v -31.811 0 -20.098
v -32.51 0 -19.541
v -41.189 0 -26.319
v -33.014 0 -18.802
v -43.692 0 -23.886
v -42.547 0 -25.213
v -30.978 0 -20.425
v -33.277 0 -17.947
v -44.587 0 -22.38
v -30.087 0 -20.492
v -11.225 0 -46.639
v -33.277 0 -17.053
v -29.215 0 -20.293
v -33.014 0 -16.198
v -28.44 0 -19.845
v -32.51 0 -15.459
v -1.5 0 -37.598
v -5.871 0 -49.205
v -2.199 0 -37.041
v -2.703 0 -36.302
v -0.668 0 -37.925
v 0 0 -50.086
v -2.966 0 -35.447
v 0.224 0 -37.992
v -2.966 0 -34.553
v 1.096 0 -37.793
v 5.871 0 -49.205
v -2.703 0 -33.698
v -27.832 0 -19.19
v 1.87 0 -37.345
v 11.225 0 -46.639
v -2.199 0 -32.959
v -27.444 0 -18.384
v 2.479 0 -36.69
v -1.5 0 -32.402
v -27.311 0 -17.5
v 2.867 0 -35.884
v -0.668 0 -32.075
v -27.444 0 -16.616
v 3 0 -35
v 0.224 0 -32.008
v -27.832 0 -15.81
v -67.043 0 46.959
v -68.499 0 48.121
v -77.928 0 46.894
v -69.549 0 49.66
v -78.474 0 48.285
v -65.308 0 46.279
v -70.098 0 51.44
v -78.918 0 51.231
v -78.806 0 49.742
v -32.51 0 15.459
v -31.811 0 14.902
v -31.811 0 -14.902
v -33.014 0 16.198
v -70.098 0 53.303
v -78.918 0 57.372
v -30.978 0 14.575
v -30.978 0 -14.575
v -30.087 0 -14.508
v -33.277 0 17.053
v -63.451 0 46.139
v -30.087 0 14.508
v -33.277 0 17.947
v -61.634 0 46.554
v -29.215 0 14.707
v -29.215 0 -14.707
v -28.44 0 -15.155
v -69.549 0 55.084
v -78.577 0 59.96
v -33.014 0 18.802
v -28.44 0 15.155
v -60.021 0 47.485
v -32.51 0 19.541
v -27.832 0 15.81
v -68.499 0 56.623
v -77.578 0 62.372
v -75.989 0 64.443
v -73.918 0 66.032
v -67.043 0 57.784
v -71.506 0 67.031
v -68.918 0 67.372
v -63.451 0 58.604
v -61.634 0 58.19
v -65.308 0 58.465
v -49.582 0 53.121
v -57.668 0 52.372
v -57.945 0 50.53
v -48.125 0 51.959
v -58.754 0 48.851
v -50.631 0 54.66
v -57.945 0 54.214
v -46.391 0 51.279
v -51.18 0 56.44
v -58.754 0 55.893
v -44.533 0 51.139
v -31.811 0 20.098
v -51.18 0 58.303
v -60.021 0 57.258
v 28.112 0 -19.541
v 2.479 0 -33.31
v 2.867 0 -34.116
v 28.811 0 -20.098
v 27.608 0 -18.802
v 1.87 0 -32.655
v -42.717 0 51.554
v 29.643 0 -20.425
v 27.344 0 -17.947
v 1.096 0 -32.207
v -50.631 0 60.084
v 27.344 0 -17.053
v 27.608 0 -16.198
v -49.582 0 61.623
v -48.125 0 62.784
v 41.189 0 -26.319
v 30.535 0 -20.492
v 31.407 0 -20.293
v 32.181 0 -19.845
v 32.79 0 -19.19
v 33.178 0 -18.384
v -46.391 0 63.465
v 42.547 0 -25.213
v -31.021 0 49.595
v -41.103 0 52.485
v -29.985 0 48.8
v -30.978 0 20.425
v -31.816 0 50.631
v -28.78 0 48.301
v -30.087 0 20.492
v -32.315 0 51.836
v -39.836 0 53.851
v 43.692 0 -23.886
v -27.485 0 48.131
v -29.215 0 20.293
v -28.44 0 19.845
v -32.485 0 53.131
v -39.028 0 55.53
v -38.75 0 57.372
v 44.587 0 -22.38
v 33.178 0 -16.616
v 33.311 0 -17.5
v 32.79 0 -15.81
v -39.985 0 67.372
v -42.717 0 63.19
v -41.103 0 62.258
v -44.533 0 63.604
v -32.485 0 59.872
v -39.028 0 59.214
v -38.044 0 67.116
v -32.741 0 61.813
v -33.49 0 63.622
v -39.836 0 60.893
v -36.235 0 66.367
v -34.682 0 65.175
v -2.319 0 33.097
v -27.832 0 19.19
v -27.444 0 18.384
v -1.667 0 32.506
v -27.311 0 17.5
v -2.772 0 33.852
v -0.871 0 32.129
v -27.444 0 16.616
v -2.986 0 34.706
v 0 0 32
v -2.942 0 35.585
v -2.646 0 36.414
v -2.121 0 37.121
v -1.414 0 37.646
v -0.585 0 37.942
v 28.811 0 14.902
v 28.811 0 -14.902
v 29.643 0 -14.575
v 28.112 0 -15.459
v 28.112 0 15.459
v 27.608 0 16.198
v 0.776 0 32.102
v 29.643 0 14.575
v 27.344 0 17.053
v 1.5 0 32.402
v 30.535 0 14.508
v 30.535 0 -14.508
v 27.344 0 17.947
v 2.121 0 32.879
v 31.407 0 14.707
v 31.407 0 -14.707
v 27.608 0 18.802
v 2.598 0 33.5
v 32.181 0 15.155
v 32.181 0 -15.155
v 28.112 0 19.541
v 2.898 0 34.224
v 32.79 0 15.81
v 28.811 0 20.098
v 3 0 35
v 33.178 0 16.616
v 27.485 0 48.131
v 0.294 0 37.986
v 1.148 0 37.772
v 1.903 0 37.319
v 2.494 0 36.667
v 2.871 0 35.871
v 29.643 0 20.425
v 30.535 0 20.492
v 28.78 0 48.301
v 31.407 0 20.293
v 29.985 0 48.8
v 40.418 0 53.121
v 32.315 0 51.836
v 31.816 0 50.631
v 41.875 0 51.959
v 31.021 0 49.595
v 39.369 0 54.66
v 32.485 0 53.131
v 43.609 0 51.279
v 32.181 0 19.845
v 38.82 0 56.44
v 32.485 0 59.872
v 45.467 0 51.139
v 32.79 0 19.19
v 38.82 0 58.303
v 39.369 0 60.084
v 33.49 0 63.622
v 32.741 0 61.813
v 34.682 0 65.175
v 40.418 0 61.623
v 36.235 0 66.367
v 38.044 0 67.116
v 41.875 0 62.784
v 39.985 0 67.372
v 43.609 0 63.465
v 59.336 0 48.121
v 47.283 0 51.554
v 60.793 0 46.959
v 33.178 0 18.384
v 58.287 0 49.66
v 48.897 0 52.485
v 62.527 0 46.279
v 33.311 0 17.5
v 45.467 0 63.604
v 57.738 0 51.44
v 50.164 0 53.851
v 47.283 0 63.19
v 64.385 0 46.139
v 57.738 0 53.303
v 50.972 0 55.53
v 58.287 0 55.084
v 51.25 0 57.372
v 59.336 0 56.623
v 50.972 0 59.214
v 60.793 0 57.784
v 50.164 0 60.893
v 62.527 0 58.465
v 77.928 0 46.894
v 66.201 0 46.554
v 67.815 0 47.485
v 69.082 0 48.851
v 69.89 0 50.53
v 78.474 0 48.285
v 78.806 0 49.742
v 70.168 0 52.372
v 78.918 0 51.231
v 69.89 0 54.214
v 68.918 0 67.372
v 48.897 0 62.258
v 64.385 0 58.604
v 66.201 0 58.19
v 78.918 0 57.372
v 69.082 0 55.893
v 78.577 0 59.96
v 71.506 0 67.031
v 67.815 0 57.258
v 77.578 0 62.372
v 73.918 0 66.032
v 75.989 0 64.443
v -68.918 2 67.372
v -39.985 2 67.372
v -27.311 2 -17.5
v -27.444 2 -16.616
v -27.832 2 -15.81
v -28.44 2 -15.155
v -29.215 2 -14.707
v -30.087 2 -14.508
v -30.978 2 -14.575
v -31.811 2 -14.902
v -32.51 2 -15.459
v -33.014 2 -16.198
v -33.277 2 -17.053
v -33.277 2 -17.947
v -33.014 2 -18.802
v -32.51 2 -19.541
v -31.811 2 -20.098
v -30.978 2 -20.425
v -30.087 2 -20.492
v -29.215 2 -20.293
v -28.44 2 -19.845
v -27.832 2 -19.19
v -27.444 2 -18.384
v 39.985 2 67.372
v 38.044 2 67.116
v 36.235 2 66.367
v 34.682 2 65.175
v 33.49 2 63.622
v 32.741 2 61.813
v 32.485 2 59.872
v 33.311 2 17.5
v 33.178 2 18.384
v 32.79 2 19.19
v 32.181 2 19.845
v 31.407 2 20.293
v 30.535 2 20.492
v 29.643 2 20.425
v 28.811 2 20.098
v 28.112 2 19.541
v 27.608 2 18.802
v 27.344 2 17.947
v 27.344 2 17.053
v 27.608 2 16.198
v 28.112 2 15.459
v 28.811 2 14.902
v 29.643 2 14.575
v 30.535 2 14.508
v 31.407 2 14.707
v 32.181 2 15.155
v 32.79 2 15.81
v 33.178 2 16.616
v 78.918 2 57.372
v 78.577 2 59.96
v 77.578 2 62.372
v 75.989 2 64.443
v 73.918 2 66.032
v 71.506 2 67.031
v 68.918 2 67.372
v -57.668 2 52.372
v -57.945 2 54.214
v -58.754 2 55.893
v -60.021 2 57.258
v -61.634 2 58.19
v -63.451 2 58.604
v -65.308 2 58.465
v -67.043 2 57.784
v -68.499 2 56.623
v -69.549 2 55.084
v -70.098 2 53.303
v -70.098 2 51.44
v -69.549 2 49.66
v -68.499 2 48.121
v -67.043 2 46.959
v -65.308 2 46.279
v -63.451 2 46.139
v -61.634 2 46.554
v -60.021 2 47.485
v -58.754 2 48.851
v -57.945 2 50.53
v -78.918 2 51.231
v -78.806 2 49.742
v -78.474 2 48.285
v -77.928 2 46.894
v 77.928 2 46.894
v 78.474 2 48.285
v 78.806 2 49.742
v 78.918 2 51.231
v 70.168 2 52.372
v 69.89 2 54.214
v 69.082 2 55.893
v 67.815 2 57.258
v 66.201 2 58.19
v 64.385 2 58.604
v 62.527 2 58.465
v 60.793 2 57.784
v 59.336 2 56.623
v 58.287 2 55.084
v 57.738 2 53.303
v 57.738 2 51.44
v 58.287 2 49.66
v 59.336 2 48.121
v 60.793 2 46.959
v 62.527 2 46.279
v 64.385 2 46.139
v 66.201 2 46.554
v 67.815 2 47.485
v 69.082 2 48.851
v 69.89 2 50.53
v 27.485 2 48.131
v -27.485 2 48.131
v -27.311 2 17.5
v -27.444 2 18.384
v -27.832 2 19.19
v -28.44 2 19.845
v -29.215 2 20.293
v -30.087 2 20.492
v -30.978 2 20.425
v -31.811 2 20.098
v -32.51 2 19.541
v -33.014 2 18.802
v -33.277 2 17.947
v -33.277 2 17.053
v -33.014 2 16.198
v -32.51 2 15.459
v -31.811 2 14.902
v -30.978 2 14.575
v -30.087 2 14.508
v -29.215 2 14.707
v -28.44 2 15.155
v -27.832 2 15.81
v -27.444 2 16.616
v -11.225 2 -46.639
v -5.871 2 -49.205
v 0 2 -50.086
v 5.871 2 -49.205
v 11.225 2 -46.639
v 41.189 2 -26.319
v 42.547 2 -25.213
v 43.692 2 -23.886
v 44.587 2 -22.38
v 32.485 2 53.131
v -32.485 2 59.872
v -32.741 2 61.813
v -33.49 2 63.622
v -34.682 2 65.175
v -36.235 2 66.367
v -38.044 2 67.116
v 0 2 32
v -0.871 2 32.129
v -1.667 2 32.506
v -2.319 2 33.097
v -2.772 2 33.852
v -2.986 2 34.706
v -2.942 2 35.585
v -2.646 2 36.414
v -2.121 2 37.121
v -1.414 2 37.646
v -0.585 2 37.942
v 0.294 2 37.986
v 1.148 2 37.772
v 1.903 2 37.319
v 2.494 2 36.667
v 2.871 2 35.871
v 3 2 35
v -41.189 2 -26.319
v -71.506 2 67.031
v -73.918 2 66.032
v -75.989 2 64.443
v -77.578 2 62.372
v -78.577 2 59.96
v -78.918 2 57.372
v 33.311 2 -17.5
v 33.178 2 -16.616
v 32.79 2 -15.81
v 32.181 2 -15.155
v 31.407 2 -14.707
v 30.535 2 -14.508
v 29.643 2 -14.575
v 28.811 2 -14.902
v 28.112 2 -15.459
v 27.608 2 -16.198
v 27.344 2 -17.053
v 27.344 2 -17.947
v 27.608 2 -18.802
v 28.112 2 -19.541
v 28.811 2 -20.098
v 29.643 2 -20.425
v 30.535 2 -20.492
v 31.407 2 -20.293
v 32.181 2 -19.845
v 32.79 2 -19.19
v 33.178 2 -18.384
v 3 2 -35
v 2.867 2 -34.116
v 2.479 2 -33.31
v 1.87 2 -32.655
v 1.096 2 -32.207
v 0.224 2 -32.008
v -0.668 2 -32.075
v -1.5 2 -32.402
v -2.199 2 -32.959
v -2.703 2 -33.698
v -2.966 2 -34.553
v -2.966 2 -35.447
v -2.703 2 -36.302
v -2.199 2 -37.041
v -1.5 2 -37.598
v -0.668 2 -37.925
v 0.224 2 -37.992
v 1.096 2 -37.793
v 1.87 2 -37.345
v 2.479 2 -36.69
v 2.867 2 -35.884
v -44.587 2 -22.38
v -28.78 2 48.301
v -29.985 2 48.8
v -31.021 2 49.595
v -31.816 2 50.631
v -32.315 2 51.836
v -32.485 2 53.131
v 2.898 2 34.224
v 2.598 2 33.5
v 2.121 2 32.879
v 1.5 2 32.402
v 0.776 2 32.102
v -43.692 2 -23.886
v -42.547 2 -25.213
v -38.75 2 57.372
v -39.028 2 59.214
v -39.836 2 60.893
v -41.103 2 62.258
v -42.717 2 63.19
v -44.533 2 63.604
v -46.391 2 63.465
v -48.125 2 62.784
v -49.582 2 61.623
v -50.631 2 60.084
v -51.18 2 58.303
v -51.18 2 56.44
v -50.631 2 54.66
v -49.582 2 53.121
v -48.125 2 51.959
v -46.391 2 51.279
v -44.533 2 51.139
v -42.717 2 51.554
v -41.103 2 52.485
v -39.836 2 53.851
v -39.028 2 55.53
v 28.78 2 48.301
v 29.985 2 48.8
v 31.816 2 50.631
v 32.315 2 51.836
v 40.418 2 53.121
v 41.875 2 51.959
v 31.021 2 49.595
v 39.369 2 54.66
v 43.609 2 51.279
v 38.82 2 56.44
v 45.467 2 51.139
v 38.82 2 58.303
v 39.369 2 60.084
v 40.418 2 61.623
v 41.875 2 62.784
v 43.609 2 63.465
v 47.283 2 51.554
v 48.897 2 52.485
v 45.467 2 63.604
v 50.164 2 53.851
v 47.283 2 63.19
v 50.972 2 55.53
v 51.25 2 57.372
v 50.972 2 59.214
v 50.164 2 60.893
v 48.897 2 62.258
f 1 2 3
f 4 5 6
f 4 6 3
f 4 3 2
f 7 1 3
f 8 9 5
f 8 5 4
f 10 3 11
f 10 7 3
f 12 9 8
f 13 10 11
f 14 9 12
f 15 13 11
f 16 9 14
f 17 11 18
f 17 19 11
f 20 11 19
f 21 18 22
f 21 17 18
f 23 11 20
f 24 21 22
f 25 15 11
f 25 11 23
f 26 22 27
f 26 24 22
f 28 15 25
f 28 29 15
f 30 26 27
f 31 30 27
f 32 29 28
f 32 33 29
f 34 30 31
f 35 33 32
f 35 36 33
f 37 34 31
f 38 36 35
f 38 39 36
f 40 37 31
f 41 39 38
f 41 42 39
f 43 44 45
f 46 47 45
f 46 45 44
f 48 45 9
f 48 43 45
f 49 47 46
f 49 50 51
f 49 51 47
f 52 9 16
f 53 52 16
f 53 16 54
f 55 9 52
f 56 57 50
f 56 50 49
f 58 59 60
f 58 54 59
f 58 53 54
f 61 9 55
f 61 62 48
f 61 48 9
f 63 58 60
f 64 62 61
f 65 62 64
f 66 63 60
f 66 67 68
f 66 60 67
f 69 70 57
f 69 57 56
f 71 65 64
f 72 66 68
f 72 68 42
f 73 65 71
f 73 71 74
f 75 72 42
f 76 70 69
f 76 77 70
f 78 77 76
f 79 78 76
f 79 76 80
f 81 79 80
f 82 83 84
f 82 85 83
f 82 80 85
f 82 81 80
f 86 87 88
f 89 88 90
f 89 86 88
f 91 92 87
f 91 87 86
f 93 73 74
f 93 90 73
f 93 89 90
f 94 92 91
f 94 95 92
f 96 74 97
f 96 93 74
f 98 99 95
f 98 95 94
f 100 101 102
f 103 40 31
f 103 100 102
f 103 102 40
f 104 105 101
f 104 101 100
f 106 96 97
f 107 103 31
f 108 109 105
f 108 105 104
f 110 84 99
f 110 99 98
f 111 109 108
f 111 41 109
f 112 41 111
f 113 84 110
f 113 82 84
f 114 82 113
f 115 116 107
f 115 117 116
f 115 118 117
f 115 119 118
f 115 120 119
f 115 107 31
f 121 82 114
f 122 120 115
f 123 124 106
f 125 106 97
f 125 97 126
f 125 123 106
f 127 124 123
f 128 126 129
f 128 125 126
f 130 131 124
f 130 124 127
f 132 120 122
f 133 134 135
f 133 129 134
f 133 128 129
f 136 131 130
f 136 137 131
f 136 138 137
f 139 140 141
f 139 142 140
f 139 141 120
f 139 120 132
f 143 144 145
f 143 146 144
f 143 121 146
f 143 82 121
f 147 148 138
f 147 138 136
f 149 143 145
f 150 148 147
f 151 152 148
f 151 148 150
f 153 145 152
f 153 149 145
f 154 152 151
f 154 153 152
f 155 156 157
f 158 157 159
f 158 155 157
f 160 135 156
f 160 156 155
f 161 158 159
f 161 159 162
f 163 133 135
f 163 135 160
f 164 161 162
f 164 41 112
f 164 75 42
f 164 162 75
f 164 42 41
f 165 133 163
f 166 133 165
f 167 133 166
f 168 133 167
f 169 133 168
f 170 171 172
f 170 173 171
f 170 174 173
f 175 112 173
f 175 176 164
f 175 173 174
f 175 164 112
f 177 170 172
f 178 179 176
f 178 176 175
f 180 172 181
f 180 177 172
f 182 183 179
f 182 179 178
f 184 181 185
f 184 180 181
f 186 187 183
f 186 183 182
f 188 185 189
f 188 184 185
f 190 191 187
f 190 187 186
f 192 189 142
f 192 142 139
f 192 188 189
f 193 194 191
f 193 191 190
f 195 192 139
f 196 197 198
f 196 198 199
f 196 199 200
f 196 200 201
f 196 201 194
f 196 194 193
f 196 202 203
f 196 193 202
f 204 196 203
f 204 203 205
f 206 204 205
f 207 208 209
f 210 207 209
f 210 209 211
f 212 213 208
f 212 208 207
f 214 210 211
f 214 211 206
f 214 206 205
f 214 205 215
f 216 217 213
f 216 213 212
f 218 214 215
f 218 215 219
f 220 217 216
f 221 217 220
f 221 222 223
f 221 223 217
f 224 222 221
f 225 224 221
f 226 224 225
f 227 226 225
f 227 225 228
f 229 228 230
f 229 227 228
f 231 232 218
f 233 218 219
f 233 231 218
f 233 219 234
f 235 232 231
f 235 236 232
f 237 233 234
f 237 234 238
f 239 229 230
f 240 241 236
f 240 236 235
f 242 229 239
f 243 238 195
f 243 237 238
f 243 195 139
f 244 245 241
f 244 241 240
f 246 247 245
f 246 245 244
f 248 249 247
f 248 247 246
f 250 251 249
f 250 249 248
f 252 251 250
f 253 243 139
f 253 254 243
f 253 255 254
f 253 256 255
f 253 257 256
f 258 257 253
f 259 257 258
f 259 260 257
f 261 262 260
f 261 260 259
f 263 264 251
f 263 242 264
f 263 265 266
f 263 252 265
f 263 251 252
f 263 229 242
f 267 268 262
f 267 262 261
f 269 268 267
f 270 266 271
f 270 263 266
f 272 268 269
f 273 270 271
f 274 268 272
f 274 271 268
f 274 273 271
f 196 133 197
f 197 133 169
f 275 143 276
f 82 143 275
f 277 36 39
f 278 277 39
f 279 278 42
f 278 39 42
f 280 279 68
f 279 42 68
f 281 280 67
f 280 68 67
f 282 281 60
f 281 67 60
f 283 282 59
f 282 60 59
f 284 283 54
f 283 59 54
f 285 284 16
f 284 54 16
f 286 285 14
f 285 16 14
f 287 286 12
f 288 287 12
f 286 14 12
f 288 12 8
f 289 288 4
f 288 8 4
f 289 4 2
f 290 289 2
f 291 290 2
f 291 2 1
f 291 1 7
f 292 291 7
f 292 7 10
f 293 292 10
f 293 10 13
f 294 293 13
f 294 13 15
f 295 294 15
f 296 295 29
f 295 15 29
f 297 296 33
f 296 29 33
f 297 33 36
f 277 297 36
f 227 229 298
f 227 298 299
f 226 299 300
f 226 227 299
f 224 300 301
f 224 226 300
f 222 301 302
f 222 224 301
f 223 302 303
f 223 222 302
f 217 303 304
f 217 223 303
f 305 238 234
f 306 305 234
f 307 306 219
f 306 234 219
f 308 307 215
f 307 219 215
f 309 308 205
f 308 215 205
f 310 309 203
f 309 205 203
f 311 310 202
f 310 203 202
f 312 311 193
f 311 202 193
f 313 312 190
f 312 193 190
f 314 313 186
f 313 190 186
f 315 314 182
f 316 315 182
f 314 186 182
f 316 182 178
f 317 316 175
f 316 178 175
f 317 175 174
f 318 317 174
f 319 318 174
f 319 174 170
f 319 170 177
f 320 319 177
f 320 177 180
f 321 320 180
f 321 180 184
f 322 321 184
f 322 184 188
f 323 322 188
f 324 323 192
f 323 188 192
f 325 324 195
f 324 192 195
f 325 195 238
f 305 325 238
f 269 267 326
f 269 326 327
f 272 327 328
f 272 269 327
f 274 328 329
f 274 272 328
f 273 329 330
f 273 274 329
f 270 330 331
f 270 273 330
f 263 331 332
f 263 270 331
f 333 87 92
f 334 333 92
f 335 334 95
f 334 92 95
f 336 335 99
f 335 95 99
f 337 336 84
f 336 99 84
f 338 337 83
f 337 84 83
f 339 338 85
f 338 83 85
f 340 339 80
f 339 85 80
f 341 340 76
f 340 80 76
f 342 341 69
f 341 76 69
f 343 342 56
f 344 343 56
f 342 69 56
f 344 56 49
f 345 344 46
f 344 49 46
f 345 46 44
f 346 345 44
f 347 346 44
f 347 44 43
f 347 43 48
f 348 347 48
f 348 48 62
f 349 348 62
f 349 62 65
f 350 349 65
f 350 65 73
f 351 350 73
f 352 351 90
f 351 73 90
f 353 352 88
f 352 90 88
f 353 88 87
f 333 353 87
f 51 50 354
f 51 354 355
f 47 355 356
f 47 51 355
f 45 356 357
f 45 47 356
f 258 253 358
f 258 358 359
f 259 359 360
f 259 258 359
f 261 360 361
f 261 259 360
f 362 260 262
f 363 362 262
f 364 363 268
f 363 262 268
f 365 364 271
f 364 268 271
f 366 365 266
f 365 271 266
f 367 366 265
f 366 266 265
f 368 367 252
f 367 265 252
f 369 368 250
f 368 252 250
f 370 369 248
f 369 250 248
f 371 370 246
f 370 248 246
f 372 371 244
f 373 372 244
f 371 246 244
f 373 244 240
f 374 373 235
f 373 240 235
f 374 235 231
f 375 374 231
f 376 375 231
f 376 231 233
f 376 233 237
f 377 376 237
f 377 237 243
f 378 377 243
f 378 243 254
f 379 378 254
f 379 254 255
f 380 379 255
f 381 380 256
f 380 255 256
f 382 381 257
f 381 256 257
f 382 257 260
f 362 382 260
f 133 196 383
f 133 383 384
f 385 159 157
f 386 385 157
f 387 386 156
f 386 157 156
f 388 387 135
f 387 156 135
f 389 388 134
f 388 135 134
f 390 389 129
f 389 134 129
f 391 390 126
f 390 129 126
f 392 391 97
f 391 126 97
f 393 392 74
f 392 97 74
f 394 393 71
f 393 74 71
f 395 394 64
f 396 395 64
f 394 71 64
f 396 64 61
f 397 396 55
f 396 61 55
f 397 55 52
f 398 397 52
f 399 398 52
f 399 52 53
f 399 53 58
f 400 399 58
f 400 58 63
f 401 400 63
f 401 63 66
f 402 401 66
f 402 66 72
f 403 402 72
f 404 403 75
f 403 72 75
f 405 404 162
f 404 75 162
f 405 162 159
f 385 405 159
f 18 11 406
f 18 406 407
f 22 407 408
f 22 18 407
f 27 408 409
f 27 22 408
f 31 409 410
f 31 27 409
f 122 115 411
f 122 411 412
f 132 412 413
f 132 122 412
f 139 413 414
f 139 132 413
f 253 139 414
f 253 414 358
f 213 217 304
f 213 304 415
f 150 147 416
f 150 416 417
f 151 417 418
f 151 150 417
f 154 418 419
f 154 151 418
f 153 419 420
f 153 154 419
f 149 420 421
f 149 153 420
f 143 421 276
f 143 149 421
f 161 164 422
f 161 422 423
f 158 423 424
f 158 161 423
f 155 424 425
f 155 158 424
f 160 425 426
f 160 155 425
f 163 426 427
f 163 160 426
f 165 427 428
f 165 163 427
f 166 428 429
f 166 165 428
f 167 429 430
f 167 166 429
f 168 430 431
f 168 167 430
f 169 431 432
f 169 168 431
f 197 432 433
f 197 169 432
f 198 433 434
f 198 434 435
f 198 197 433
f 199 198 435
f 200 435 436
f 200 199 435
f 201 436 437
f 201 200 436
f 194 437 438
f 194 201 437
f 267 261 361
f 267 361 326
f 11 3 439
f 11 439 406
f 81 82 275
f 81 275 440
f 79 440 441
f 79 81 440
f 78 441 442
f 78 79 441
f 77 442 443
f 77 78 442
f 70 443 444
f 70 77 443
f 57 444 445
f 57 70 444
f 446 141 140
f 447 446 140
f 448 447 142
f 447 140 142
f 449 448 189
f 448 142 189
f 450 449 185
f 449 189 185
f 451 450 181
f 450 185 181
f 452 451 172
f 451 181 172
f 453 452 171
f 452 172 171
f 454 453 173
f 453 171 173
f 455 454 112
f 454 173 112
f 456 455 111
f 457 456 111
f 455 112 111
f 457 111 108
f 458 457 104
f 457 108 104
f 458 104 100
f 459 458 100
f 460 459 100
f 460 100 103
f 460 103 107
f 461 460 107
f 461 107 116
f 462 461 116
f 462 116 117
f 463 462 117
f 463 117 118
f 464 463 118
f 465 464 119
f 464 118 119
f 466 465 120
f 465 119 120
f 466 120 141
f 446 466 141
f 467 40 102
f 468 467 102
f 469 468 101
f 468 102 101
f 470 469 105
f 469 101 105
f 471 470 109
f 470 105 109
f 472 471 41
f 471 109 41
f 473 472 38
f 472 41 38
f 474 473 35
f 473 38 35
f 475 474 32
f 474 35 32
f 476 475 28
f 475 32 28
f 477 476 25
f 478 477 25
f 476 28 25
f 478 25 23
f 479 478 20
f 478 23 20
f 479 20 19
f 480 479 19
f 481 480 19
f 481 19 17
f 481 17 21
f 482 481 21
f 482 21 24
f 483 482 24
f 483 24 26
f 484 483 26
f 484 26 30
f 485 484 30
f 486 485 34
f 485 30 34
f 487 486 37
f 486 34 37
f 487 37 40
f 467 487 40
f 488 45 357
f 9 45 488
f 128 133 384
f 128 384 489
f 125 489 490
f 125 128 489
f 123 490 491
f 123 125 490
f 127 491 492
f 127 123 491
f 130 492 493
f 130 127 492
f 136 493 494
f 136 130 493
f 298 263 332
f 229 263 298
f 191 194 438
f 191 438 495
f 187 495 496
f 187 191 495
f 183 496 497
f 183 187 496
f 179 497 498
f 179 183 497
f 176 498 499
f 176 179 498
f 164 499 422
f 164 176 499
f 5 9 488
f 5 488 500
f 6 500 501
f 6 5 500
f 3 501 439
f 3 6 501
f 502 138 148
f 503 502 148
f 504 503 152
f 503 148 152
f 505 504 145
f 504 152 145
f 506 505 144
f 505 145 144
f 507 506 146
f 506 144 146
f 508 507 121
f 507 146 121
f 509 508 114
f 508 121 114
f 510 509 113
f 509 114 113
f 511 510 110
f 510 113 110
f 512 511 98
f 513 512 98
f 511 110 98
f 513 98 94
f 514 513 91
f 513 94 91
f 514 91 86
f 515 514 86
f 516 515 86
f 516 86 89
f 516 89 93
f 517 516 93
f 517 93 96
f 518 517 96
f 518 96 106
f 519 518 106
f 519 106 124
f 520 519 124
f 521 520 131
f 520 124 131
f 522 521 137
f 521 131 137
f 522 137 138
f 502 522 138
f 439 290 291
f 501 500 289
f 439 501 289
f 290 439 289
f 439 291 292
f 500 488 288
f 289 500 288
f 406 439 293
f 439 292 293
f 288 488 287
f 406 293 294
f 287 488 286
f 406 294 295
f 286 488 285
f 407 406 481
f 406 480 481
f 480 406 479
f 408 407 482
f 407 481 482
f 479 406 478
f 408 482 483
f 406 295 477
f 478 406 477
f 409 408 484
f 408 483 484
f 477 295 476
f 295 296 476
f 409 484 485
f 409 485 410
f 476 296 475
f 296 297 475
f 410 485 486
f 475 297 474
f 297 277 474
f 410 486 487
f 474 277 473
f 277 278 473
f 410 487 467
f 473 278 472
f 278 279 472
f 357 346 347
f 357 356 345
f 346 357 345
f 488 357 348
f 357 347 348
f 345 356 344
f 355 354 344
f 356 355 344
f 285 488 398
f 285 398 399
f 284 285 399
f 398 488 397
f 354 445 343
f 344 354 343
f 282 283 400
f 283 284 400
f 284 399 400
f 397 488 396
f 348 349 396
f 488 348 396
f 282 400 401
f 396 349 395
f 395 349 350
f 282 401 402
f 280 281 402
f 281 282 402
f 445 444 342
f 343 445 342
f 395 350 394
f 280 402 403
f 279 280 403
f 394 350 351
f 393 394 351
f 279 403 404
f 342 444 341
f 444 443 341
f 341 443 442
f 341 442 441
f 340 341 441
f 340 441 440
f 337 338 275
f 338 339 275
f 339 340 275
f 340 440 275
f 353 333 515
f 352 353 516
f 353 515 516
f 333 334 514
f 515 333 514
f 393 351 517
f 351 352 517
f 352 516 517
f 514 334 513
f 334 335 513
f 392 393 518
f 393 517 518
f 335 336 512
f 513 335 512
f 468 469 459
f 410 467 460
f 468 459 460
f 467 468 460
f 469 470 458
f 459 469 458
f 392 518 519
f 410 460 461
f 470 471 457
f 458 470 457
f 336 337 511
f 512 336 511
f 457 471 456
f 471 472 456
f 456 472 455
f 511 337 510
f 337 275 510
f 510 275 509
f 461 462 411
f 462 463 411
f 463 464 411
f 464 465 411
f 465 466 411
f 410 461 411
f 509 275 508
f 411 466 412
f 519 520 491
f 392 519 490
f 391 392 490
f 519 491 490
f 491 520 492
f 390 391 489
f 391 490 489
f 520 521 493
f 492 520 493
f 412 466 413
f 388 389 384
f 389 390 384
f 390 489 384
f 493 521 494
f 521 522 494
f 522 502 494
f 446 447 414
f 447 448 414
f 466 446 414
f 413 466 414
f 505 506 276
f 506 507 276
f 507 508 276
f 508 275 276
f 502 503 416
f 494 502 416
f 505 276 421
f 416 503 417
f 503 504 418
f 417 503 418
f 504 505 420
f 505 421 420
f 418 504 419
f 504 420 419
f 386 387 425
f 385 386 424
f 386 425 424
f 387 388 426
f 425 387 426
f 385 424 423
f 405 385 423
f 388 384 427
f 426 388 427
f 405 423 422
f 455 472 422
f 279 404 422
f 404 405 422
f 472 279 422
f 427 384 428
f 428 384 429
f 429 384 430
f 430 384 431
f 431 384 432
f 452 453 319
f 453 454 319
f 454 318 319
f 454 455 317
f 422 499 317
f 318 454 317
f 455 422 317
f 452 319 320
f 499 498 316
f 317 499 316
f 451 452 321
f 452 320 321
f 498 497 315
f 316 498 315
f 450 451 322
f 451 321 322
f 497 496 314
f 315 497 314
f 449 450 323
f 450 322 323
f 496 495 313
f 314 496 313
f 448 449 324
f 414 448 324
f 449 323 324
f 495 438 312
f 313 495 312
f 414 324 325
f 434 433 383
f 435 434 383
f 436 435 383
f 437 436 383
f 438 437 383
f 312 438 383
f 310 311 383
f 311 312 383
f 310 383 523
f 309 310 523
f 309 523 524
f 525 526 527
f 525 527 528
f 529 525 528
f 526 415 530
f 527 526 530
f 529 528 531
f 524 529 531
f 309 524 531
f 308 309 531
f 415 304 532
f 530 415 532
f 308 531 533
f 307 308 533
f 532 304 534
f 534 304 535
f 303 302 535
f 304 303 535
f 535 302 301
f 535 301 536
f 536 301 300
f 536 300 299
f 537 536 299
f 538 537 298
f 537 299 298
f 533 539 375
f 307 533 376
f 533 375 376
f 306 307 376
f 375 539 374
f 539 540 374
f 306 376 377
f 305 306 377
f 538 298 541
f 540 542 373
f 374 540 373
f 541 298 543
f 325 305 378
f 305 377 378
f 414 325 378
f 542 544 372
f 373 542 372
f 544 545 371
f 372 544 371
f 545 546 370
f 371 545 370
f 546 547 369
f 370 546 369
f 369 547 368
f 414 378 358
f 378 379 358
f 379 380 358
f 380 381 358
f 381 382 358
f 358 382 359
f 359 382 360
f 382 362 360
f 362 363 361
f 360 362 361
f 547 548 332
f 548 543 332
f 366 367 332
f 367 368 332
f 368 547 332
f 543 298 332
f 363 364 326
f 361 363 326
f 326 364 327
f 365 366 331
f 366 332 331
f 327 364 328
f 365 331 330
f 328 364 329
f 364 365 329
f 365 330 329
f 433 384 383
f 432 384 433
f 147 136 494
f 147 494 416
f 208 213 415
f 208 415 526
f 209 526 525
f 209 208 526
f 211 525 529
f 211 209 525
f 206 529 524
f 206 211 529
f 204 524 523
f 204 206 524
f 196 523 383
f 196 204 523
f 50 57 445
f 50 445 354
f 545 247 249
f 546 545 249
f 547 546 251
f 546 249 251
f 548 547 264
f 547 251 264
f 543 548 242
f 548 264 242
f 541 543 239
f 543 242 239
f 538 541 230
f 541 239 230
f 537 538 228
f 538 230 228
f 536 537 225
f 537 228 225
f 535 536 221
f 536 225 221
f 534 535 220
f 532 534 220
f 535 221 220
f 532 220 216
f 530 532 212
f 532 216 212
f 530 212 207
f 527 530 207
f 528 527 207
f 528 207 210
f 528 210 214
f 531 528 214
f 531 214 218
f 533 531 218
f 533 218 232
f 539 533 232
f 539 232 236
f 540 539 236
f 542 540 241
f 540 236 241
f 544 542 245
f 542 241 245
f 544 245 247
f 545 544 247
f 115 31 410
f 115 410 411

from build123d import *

# Parameters (mm, degrees)
F1_R     = 3
F1_R_2   = 6.25
F2_DEPTH = 2


with BuildPart() as f2:
    # F1 (on Front) → F2 (new body)
    with BuildSketch(Plane.XZ):
        with BuildLine():
            Line((-41.189004, -26.319483), (-11.225195, -46.63929))
            ThreePointArc((-11.225195, -46.63929), (0, -50.086496), (11.225195, -46.63929))
            Line((11.225195, -46.63929), (41.189004, -26.319483))
            ThreePointArc((41.189004, -26.319483), (43.148737, -24.574534), (44.587085, -22.379868))
            Line((44.587085, -22.379868), (77.928371, 46.894439))
            ThreePointArc((77.928371, 46.894439), (78.667226, 49.007124), (78.917693, 51.231222))
            Line((78.917693, 51.231222), (78.917693, 57.371839))
            ThreePointArc((78.917693, 57.371839), (75.988761, 64.442907), (68.917693, 67.371839))
            Line((68.917693, 67.371839), (39.985476, 67.371839))
            ThreePointArc((39.985476, 67.371839), (34.682175, 65.17514), (32.485476, 59.871839))
            Line((32.485476, 59.871839), (32.485476, 53.130572))
            ThreePointArc((32.485476, 53.130572), (31.02101, 49.595038), (27.485476, 48.130572))
            Line((27.485476, 48.130572), (0, 48.130572))
            Line((0, 48.130572), (-27.485476, 48.130572))
            ThreePointArc((-27.485476, 48.130572), (-31.02101, 49.595038), (-32.485476, 53.130572))
            Line((-32.485476, 53.130572), (-32.485476, 59.871839))
            ThreePointArc((-32.485476, 59.871839), (-34.682175, 65.17514), (-39.985476, 67.371839))
            Line((-39.985476, 67.371839), (-68.917693, 67.371839))
            ThreePointArc((-68.917693, 67.371839), (-75.988761, 64.442907), (-78.917693, 57.371839))
            Line((-78.917693, 57.371839), (-78.917693, 51.231222))
            ThreePointArc((-78.917693, 51.231222), (-78.667226, 49.007124), (-77.928371, 46.894439))
            Line((-77.928371, 46.894439), (-44.587085, -22.379868))
            ThreePointArc((-44.587085, -22.379868), (-43.148737, -24.574534), (-41.189004, -26.319483))
        make_face()
        with Locations((-30.310889, -17.5)):
            Circle(F1_R, mode=Mode.SUBTRACT)
        with Locations((0, -35)):
            Circle(F1_R, mode=Mode.SUBTRACT)
        with Locations((30.310889, -17.5)):
            Circle(F1_R, mode=Mode.SUBTRACT)
        with Locations((-30.310889, 17.5)):
            Circle(F1_R, mode=Mode.SUBTRACT)
        with Locations((-63.917693, 52.371839)):
            Circle(F1_R_2, mode=Mode.SUBTRACT)
        with Locations((-45, 57.371839)):
            Circle(F1_R_2, mode=Mode.SUBTRACT)
        with Locations((30.310889, 17.5)):
            Circle(F1_R, mode=Mode.SUBTRACT)
        with BuildLine():
            ThreePointArc((0, 32), (-2.12132, 37.12132), (3, 35))
            ThreePointArc((3, 35), (2.12132, 32.87868), (0, 32))
        make_face(mode=Mode.SUBTRACT)
        with Locations((63.917693, 52.371839)):
            Circle(F1_R_2, mode=Mode.SUBTRACT)
        with Locations((45, 57.371839)):
            Circle(F1_R_2, mode=Mode.SUBTRACT)
    extrude(amount=-F2_DEPTH)


solid = f2.part
